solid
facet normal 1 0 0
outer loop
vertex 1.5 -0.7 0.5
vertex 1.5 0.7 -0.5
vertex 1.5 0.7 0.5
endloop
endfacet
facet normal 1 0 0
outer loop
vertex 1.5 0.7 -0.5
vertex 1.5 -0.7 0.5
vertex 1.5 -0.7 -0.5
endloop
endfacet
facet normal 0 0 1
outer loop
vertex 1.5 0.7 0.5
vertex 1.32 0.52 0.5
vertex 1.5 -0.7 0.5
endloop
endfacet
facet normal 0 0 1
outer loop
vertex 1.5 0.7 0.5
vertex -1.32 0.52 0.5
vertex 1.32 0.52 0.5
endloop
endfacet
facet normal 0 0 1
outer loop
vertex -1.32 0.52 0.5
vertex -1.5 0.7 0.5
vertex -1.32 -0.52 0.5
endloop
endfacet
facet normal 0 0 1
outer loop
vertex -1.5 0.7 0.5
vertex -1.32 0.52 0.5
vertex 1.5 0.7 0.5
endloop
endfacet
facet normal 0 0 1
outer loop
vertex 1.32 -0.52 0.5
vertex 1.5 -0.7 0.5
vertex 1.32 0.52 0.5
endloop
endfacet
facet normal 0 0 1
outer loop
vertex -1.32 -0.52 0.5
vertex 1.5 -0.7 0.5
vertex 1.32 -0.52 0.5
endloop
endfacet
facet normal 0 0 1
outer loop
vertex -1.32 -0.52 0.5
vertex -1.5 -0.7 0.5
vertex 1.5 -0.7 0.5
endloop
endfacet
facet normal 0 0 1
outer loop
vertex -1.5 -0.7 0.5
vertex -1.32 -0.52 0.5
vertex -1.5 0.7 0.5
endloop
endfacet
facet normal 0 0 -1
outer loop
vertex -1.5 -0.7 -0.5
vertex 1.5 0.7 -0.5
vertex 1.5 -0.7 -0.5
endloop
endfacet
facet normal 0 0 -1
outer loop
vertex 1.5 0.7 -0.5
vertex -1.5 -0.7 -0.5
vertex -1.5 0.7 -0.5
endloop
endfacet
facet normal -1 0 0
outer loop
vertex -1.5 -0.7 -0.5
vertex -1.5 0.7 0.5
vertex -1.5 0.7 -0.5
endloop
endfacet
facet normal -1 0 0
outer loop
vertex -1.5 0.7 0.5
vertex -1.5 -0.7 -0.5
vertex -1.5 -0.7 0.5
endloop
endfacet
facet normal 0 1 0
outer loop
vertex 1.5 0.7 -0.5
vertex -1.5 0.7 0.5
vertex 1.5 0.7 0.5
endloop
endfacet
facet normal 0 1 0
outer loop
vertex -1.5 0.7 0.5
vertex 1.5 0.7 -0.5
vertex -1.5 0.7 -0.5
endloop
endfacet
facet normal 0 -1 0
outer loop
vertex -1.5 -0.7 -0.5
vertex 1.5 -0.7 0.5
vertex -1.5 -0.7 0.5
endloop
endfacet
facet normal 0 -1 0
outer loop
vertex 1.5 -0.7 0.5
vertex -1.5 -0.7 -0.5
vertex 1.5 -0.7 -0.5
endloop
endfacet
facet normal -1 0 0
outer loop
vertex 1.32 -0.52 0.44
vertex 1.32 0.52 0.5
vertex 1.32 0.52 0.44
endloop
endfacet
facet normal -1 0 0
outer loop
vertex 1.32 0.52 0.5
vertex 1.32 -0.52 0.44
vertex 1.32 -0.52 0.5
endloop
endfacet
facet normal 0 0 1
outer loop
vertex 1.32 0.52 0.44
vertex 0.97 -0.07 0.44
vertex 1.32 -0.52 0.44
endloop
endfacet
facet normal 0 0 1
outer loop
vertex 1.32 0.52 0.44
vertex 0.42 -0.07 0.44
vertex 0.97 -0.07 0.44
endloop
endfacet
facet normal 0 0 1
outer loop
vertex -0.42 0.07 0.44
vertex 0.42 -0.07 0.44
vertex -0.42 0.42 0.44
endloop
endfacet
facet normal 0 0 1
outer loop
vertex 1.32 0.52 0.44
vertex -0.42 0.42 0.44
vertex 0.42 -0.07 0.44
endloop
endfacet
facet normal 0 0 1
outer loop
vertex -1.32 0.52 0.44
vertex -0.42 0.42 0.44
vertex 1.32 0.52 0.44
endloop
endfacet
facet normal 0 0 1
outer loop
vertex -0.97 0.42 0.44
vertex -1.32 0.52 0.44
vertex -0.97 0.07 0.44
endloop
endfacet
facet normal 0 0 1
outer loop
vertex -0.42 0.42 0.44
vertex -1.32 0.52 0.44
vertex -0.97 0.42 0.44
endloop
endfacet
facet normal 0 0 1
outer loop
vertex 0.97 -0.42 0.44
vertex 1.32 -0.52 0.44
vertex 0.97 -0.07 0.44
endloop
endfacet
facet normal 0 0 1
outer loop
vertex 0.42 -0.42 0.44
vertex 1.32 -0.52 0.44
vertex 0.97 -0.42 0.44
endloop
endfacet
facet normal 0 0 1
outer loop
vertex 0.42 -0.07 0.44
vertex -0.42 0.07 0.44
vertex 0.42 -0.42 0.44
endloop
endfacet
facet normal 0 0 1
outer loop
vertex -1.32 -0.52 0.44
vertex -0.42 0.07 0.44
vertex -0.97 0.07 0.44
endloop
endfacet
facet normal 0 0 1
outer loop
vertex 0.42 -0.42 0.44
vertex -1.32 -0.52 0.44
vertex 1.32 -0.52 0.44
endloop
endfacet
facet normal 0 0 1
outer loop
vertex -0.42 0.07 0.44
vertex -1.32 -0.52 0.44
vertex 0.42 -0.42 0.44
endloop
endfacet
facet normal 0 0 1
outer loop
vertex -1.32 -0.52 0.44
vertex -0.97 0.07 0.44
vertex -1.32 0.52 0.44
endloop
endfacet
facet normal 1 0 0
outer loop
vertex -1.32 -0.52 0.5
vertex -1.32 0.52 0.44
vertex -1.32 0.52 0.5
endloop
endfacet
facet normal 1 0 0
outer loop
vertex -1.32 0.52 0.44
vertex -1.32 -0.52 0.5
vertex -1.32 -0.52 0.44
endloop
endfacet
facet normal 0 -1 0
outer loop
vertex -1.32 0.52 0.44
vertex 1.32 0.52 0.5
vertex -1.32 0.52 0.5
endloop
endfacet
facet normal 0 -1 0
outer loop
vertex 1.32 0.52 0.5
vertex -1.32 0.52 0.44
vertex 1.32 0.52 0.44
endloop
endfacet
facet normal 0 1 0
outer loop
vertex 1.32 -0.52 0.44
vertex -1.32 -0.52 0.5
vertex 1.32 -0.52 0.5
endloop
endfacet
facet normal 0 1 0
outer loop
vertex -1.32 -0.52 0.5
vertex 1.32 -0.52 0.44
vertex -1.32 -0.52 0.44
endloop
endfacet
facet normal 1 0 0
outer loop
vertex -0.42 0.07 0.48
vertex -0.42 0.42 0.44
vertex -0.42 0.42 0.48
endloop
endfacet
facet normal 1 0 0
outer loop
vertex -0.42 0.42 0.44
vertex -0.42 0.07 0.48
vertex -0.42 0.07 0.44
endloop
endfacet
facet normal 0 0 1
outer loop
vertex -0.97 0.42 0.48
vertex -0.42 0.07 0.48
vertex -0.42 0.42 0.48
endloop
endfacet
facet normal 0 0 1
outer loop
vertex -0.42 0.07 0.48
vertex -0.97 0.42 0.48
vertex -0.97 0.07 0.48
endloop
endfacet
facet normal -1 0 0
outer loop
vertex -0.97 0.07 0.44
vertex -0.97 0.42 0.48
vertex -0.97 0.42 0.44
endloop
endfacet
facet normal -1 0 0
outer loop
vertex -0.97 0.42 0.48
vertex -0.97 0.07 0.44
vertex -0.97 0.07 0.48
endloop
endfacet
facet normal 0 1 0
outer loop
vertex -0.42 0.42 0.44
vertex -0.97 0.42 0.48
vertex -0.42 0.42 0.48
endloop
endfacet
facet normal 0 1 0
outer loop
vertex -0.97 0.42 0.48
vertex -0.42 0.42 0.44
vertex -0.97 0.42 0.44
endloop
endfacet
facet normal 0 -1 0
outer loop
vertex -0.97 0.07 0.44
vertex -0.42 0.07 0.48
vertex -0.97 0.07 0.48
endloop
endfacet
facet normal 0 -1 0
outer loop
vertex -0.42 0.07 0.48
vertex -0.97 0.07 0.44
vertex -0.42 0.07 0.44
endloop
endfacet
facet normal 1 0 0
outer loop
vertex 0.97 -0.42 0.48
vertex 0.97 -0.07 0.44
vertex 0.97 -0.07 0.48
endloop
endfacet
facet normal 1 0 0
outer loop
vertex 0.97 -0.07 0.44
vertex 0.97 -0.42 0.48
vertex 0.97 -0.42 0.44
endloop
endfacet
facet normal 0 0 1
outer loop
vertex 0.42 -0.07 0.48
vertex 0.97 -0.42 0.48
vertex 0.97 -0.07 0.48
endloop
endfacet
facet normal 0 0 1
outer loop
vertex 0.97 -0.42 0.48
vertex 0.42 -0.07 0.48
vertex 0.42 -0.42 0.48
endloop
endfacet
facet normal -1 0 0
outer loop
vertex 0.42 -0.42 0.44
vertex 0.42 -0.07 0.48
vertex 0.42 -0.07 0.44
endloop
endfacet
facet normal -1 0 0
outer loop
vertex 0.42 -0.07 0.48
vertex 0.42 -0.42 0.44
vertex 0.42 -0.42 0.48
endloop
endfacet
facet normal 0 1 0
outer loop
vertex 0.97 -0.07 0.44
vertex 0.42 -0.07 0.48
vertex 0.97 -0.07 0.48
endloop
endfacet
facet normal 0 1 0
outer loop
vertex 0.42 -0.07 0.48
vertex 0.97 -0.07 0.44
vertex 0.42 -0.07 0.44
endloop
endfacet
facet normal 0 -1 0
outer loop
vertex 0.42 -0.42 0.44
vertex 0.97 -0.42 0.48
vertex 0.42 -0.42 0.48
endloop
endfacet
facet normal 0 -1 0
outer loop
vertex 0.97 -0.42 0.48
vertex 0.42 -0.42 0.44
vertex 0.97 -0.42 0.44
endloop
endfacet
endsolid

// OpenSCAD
// SMD package overall size (X,Y,Z) = [3, 1.4, 1.0]
// One connected solid. No floating parts. All placements are formula-based.

body_length = 3.0;
body_width  = 1.4;
body_height = 1.0;

// Frame (blue) thickness around the inner (orange) area as seen in renders
frame_wall = 0.18;          // per-side wall thickness in X/Y
inner_top_recess = 0.06;    // depth of top recess (keeps outer silhouette same)

// Small rectangular feature (blue) that appears on different sides in left/right views
feat_x = 0.55;
feat_y = 0.35;
feat_z = 0.22;
feat_inset = 0.10;          // inset from the inner edge
feat_end_offset = 0.35;     // distance from end along length

eps = 0.02;

// Derived inner pocket size (clamped)
inner_len = max(eps, body_length - 2*frame_wall);
inner_wid = max(eps, body_width  - 2*frame_wall);
inner_dep = max(eps, inner_top_recess);

// Main outer body
module outer_body() {
  cube([body_length, body_width, body_height], center=true);
}

// Top recess to create the "frame" look in front/back/left/right views
module top_recess() {
  // Pocket starts at top surface and goes downward by inner_dep
  zc = body_height/2 - inner_dep/2 + eps;
  translate([0, 0, zc])
    cube([inner_len, inner_wid, inner_dep + 2*eps], center=true);
}

// Small feature on the recessed top surface.
// Positioned so it is visible in:
// - Front/Back: near left/right end (X direction)
// - Left/Right: near top/bottom (Y direction) by swapping Y sign
module top_feature(y_side=1, x_side=-1) {
  // Place on top surface, slightly embedded for watertight union
  zc = body_height/2 - inner_dep - feat_z/2 + eps;

  // X: near one end, inside the inner pocket
  x_inner_edge = x_side * (inner_len/2);
  xc = x_inner_edge + (-x_side) * (feat_end_offset + feat_x/2);

  // Y: near one side of the inner pocket (changes between left/right views)
  y_inner_edge = y_side * (inner_wid/2);
  yc = y_inner_edge - y_side * (feat_inset + feat_y/2);

  translate([xc, yc, zc])
    cube([feat_x, feat_y, feat_z + 2*eps], center=true);
}

module smd() {
  union() {
    difference() {
      outer_body();
      top_recess();
    }
    // Two features to match the ambiguous side-view behavior:
    // one near (-X, +Y) and one near (+X, -Y)
    top_feature(y_side= 1, x_side=-1);
    top_feature(y_side=-1, x_side= 1);
  }
}

smd();
